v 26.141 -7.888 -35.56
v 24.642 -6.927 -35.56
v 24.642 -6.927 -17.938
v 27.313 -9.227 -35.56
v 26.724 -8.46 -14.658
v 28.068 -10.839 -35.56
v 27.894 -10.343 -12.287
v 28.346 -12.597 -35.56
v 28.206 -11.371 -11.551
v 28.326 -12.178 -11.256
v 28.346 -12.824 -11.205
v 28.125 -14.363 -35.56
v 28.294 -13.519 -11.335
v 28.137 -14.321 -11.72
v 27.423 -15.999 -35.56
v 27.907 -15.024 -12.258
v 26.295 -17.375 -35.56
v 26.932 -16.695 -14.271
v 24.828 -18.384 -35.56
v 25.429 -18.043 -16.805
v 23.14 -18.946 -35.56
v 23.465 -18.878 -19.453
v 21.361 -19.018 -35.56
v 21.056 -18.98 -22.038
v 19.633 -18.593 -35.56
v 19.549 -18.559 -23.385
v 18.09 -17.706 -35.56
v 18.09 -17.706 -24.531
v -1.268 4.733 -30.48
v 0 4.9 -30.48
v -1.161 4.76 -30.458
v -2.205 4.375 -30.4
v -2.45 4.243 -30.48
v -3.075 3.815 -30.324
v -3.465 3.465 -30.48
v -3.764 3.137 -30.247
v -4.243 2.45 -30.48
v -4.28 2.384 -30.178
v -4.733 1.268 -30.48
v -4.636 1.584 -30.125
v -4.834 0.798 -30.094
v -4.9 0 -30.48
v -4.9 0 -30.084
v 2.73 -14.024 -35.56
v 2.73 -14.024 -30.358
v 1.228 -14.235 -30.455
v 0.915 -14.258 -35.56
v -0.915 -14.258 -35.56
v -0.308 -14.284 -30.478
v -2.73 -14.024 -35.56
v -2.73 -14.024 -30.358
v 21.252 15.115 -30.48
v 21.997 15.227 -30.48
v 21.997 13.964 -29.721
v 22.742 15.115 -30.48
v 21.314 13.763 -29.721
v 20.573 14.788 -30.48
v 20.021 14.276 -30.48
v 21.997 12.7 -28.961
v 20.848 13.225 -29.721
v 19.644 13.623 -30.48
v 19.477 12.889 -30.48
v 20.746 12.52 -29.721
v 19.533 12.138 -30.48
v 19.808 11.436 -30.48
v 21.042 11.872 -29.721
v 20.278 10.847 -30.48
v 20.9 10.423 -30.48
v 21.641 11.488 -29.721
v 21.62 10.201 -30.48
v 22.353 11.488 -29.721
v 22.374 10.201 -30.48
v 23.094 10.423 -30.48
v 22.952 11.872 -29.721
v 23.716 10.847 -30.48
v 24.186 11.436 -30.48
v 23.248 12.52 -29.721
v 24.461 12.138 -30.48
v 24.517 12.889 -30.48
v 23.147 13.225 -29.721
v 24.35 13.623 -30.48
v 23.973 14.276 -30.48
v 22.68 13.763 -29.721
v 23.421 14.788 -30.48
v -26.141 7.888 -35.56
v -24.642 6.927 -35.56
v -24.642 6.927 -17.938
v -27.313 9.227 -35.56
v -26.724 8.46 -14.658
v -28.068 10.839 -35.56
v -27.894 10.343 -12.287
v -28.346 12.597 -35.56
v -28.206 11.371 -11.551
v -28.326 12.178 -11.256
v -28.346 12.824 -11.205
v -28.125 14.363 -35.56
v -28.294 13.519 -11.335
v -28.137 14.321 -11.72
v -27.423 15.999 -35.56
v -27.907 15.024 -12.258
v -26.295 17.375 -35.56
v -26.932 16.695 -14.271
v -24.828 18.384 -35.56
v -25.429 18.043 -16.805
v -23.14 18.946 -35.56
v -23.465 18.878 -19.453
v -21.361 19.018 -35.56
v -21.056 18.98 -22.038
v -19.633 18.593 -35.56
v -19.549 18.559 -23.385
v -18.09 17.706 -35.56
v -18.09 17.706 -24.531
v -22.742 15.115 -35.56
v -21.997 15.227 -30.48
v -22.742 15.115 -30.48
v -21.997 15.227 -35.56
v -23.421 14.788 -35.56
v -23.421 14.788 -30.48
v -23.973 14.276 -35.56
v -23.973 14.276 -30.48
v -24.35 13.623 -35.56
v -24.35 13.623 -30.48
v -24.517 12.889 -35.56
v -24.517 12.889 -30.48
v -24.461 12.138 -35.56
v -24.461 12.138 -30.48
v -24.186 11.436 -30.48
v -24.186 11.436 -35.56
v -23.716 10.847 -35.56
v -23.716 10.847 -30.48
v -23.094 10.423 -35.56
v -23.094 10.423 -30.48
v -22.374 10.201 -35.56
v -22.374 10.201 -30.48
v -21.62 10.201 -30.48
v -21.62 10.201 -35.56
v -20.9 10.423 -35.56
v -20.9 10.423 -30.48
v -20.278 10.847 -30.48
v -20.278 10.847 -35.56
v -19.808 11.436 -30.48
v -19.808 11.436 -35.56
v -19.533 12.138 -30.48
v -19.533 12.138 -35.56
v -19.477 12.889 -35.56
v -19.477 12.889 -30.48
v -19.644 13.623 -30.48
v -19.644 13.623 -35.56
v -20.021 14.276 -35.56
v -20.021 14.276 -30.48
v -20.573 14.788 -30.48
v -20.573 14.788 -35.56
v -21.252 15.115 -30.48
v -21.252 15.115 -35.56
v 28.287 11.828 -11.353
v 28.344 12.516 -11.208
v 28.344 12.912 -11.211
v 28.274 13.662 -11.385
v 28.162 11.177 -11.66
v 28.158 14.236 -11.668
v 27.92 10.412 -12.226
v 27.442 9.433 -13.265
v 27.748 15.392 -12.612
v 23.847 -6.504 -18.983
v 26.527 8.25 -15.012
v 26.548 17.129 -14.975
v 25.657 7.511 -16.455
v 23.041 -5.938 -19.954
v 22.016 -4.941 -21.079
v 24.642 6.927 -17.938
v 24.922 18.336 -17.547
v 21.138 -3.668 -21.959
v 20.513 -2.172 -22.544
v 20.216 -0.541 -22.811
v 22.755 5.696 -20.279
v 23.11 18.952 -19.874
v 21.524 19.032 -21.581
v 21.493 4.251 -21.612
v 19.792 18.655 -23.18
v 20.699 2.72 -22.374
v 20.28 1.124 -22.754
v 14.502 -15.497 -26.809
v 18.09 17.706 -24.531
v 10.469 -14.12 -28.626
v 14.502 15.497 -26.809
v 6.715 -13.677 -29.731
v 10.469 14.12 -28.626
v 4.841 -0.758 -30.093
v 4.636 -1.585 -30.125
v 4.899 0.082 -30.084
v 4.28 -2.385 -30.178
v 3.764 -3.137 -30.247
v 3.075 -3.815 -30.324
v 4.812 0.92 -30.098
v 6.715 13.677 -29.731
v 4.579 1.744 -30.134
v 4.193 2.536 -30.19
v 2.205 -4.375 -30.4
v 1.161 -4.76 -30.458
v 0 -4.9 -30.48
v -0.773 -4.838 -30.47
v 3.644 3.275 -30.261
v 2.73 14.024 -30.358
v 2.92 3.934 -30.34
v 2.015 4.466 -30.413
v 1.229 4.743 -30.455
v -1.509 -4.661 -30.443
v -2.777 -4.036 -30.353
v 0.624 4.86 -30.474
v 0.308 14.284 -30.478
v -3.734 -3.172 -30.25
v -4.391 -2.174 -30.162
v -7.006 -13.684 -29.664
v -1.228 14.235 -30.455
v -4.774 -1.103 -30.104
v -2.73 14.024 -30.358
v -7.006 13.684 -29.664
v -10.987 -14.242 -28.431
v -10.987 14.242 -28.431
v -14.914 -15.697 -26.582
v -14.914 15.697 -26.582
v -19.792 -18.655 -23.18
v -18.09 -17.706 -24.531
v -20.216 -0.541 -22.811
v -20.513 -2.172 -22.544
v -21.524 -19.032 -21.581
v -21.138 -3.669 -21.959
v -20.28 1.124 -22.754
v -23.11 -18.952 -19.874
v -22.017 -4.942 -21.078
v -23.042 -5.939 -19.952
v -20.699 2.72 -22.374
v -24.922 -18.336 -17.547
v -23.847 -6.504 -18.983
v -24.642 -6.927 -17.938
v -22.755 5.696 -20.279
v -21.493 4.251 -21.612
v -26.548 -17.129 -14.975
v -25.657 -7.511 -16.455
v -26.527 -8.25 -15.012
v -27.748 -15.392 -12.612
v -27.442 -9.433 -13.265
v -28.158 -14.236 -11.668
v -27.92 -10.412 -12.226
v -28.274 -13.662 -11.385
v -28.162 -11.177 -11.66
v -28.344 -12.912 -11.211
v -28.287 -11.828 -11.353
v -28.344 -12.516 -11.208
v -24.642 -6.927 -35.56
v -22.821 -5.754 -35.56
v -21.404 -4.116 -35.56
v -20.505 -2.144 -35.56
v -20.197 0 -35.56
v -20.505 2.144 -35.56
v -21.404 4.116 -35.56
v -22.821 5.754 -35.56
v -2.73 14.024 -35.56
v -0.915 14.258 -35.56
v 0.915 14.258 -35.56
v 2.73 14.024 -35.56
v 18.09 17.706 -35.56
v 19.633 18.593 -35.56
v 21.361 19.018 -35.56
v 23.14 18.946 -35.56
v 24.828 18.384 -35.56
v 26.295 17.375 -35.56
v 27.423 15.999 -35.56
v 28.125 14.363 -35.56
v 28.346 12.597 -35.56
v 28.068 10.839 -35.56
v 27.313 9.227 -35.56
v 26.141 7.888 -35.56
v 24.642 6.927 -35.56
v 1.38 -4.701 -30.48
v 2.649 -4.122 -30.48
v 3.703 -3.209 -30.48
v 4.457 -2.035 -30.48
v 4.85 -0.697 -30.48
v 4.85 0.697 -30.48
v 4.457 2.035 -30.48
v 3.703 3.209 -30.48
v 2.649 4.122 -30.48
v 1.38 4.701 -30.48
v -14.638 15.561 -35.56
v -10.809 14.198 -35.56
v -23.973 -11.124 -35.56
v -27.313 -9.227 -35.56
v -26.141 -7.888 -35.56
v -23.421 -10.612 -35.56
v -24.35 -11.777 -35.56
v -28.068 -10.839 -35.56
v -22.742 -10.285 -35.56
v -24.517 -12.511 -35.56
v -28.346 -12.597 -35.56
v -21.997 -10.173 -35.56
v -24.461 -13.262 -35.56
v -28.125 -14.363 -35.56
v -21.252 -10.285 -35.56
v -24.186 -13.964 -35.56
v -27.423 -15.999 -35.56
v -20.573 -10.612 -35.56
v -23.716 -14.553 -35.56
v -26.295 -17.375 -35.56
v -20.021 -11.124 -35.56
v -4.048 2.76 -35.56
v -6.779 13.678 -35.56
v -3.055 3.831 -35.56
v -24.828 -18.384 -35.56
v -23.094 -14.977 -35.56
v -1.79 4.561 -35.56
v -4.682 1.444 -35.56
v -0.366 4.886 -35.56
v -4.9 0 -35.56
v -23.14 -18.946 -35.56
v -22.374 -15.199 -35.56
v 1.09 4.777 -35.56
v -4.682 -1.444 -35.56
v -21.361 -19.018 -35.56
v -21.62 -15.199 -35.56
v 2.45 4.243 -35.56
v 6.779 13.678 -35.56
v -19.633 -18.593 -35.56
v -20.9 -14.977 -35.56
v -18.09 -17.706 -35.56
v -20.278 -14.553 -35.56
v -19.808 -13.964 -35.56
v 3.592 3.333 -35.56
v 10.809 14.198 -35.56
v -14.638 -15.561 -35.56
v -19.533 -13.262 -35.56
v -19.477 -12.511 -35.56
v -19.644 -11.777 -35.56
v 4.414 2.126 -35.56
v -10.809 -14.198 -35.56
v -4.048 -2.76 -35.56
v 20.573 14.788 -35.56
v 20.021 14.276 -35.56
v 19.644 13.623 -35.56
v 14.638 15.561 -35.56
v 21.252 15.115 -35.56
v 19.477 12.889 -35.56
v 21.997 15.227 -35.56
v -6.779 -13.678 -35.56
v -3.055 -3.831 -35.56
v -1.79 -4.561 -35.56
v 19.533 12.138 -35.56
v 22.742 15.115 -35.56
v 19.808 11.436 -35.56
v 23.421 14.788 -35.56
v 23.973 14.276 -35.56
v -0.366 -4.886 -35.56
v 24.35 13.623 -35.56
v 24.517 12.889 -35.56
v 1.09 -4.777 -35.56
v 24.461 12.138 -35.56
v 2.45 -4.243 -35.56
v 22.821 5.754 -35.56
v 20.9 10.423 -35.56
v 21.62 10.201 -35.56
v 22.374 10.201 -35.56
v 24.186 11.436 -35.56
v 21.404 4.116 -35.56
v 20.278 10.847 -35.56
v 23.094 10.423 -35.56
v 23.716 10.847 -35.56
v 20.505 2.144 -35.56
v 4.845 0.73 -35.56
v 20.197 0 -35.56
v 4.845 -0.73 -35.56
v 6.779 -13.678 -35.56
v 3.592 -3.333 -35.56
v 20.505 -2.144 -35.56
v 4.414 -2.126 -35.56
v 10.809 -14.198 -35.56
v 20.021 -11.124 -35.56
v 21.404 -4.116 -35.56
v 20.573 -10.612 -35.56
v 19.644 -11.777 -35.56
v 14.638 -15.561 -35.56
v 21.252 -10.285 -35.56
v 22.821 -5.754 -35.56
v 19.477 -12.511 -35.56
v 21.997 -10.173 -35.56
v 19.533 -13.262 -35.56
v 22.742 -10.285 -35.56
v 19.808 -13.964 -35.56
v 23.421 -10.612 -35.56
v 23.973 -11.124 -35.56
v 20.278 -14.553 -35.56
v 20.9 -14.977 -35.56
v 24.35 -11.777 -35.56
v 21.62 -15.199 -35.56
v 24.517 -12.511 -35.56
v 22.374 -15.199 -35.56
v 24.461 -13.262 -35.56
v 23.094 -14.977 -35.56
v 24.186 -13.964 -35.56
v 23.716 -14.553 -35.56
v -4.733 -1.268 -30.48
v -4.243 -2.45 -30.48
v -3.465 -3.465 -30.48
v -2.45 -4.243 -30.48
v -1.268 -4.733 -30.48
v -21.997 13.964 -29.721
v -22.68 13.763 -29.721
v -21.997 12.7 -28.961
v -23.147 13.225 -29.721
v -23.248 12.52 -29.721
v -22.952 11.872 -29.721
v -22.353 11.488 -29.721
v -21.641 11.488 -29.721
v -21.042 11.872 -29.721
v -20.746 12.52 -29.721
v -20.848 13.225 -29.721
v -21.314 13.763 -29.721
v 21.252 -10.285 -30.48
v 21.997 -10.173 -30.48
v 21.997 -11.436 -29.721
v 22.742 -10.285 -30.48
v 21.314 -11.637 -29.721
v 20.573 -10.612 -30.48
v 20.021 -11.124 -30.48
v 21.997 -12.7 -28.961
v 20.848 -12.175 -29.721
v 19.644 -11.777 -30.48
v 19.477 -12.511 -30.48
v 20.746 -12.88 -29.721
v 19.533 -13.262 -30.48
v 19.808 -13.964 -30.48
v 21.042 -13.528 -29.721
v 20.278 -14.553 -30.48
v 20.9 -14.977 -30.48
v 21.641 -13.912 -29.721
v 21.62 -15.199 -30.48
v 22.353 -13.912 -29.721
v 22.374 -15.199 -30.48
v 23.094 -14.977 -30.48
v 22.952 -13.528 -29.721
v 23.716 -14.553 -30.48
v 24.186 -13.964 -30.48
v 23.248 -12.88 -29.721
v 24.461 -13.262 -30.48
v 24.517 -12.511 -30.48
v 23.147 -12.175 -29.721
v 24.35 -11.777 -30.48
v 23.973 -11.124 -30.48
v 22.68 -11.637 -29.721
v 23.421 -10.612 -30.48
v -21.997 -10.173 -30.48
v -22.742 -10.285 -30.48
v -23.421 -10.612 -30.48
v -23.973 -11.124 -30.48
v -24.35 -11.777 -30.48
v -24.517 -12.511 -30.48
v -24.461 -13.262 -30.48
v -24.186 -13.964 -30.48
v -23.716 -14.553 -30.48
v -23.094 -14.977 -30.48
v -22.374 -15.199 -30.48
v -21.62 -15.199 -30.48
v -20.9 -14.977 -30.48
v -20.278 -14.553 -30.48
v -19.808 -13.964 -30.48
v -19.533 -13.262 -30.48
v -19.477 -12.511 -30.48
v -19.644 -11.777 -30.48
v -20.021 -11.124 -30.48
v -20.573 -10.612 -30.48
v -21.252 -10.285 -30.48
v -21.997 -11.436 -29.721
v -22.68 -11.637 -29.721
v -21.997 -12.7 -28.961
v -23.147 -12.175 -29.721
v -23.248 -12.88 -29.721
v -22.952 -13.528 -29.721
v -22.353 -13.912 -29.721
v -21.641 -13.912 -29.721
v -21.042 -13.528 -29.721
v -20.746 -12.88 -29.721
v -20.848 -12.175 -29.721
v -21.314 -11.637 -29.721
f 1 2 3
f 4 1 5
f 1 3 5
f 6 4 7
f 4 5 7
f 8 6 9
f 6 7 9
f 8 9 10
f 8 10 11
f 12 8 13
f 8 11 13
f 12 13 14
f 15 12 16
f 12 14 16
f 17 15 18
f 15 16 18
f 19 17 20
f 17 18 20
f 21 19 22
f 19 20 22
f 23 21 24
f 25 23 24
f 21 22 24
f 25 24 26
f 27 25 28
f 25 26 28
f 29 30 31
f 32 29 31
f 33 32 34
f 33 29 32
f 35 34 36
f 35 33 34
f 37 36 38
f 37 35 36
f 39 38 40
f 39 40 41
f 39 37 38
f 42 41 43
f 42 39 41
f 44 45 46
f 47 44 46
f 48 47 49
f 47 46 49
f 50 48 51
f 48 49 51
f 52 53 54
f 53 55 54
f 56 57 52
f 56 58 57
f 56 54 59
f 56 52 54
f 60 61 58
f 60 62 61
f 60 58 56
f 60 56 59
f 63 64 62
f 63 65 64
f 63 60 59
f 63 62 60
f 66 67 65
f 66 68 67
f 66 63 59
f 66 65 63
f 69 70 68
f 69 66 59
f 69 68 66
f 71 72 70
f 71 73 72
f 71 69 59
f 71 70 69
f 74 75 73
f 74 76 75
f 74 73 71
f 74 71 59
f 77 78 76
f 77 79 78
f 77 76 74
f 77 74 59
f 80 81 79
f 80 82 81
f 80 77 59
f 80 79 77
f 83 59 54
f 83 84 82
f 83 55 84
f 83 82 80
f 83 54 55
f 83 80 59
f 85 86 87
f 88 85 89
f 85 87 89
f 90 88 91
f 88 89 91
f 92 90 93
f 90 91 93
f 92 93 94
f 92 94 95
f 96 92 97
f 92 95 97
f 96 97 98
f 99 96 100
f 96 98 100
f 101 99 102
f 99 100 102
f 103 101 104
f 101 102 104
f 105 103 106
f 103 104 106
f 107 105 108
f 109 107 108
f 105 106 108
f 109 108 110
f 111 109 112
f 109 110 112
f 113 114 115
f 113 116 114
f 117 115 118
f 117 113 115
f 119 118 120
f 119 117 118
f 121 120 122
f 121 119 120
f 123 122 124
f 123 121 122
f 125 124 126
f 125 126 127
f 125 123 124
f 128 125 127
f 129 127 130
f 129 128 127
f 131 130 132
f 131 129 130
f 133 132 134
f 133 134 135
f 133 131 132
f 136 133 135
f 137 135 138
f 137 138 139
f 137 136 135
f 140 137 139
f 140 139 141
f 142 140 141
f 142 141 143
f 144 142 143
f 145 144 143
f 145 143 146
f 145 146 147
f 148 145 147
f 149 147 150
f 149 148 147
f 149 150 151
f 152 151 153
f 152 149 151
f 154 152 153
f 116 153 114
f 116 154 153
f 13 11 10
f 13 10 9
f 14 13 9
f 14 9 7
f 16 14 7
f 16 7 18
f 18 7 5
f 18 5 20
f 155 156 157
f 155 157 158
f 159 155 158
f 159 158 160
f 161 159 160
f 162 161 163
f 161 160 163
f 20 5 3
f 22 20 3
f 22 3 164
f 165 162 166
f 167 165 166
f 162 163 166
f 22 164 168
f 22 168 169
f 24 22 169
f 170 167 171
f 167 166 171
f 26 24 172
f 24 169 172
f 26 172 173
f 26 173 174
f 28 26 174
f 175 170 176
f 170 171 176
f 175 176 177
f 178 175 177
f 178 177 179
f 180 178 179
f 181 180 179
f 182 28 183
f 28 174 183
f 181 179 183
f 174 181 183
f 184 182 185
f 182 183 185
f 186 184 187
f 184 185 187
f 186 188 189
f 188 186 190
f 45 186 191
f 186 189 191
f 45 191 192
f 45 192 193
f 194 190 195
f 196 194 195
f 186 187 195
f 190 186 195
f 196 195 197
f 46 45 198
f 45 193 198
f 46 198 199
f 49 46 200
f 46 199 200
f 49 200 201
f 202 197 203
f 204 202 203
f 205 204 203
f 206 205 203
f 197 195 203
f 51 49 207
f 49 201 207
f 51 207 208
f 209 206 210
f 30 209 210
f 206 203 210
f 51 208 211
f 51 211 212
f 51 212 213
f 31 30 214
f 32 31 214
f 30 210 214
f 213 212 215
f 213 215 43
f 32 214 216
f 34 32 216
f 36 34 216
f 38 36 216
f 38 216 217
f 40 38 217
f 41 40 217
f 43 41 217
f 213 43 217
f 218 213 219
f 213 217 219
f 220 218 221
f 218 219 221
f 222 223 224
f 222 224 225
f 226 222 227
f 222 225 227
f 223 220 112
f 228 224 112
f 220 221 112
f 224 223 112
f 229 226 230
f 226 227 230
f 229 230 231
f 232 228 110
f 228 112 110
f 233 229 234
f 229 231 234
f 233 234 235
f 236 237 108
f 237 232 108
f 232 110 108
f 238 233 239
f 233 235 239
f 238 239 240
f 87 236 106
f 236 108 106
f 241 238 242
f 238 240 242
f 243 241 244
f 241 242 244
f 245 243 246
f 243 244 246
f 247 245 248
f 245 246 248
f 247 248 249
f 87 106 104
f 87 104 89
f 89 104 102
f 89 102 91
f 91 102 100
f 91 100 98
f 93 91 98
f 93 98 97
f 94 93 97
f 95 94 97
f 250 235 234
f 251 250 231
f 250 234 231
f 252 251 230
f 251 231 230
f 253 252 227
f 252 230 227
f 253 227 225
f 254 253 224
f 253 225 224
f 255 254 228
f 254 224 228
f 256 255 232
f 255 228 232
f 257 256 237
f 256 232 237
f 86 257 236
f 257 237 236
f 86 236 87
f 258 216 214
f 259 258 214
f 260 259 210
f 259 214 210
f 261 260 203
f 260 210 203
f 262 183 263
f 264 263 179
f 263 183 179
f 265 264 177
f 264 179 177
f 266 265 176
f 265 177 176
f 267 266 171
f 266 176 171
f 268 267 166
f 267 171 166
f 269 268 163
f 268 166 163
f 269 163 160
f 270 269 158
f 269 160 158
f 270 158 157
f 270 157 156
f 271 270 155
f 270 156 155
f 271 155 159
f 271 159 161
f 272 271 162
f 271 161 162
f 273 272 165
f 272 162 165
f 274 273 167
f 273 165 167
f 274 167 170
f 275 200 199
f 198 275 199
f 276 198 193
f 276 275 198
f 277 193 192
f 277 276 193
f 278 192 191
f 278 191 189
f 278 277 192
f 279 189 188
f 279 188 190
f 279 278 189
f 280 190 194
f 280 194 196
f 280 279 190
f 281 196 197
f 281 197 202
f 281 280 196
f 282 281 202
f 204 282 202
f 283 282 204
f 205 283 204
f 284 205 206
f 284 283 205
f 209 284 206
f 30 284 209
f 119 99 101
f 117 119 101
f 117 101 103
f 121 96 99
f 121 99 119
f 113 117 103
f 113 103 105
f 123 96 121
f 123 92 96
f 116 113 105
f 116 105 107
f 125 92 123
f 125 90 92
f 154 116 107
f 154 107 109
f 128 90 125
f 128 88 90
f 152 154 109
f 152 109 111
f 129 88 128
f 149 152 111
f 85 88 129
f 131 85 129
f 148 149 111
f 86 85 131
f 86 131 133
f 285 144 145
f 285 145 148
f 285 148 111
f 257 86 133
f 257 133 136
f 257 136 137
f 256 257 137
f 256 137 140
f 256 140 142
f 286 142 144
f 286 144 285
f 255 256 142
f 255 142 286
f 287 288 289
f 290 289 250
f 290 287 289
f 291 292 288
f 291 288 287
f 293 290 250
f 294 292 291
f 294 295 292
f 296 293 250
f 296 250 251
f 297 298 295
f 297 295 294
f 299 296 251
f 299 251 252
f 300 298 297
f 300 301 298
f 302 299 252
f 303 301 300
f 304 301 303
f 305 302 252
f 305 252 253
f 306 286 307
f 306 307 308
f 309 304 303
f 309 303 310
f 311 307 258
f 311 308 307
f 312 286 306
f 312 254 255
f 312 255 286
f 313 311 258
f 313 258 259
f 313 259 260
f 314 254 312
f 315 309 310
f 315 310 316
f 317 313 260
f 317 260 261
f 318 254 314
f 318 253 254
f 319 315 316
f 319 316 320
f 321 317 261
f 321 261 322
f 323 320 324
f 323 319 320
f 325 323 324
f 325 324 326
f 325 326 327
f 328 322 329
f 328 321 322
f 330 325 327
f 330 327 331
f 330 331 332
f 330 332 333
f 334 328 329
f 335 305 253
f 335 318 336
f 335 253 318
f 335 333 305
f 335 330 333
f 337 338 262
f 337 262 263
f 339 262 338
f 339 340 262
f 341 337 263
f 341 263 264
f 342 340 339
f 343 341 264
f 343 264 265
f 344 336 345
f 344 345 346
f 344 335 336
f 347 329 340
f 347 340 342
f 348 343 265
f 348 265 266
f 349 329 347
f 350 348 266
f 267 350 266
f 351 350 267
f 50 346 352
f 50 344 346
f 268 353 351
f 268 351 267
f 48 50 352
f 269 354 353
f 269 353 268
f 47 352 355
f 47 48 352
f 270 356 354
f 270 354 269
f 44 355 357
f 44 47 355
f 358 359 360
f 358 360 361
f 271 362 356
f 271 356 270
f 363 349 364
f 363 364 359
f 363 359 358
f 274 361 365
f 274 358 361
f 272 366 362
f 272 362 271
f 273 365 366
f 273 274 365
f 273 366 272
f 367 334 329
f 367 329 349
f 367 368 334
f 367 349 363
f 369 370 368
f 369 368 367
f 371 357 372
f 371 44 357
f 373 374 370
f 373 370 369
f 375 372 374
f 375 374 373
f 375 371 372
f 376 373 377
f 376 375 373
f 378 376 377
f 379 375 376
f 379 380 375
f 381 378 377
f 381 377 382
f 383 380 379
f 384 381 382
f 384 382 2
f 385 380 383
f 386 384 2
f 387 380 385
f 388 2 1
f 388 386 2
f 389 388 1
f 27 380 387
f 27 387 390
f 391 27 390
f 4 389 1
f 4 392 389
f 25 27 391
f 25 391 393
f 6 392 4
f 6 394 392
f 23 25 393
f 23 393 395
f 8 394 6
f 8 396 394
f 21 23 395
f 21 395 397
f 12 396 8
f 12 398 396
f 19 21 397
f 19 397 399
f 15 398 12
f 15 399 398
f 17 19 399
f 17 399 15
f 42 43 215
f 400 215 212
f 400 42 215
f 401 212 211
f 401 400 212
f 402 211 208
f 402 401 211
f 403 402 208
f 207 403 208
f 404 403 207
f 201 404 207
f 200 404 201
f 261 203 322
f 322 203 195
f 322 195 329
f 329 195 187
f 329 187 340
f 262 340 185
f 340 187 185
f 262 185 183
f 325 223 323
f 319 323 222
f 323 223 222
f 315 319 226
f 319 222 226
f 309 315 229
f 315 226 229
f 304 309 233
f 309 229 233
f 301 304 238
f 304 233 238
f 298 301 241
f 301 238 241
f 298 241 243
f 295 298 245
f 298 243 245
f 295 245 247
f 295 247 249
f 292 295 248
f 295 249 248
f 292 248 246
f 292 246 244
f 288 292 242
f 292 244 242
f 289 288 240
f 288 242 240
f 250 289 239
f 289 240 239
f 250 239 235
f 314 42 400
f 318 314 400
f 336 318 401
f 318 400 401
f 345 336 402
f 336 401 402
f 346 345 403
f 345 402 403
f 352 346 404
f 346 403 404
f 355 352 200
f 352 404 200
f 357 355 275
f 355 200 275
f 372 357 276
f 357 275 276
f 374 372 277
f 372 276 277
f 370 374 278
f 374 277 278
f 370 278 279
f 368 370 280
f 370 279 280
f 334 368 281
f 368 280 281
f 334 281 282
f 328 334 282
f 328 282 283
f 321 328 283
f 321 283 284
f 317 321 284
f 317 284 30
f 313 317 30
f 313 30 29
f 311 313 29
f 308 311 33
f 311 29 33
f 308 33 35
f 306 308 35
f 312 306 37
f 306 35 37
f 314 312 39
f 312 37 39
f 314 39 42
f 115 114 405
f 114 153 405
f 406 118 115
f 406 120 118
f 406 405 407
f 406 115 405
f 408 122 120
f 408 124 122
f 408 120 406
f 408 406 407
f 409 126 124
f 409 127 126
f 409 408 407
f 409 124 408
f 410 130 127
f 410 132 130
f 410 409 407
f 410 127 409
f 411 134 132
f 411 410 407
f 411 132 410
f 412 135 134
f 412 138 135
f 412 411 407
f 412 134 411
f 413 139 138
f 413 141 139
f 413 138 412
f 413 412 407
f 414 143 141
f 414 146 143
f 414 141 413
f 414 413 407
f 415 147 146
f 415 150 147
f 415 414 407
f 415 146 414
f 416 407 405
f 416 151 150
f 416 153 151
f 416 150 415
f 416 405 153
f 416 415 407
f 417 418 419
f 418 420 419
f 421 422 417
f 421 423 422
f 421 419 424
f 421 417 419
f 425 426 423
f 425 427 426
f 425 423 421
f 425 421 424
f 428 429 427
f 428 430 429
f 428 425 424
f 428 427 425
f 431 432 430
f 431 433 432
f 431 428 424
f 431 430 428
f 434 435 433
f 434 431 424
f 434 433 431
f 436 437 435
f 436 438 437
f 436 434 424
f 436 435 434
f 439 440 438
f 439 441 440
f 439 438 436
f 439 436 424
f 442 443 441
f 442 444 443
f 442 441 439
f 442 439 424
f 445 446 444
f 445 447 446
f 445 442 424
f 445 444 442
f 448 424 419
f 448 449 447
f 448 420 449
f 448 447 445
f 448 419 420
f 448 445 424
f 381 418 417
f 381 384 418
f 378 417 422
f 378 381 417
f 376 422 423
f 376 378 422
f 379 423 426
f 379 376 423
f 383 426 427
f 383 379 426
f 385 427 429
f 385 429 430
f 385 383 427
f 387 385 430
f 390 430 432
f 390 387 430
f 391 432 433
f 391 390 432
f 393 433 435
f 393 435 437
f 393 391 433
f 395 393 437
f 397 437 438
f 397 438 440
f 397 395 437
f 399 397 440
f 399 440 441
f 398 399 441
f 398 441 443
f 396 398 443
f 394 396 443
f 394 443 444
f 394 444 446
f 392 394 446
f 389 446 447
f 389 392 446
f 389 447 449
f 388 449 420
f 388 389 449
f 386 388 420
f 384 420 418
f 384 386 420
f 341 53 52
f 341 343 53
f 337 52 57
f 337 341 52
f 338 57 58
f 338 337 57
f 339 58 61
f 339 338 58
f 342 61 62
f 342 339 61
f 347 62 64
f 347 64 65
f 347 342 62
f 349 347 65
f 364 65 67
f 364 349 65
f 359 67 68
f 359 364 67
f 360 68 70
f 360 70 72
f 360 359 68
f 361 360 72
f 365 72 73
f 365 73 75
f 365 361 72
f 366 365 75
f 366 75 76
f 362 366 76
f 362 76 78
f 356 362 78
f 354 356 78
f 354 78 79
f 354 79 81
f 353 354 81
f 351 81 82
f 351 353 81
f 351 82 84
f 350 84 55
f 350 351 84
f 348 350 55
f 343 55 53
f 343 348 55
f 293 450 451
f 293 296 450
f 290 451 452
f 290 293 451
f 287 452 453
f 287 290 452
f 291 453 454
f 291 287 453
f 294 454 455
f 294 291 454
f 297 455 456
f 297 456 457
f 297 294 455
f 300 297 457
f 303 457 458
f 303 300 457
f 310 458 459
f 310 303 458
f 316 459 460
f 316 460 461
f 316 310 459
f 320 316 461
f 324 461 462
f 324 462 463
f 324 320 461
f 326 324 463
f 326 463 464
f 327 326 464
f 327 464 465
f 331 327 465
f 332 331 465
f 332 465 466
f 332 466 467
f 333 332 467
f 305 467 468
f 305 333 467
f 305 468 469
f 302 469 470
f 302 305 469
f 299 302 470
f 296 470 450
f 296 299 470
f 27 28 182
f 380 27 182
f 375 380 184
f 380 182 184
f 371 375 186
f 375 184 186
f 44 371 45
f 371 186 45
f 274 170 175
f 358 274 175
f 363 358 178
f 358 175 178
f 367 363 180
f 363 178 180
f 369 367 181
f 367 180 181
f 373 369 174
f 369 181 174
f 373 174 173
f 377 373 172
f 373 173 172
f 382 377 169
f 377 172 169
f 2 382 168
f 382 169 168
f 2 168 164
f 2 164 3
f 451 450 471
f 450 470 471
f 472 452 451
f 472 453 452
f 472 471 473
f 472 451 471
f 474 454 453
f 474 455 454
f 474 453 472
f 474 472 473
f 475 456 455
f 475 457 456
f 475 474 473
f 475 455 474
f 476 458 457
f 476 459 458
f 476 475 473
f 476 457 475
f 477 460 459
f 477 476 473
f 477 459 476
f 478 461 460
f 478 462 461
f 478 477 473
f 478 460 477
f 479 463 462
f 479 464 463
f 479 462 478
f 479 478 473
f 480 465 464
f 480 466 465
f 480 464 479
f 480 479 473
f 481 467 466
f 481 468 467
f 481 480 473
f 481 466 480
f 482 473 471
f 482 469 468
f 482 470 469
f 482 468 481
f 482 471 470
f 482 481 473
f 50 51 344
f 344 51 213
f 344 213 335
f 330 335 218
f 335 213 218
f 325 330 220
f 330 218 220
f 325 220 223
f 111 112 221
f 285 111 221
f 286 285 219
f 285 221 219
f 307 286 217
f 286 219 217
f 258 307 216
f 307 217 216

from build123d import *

# Parameters (mm, degrees)
SKETCH2_W                           = 30.48
SKETCH2_H                           = 152.4
BOSS_EXTRUDE1_DEPTH                 = 25.4
BOSS_EXTRUDE1_DEPTH_BACK            = 5.08
SKETCH4_R                           = 4.89966
F_8_0_199_DIAMETER_HOLE1_AT_2_COUNT = 2
F_8_0_199_DIAMETER_HOLE1_AT_2_PITCH = 50.8
F_8_0_199_DIAMETER_HOLE1_AT_3_COUNT = 2
F_8_0_199_DIAMETER_HOLE1_AT_3_PITCH = 43.994090512
F_8_0_199_DIAMETER_HOLE1_AT_4_COUNT = 2
F_8_0_199_DIAMETER_HOLE1_AT_4_PITCH = 25.4


with BuildPart() as part:
    # Sketch2 → Revolve1 (revolve)
    with BuildSketch(Plane(origin=(0, 0, 0), x_dir=(0, 0, -1), z_dir=(1, 0, 0))):
        with Locations((15.24, 0)):
            Rectangle(SKETCH2_W, SKETCH2_H)
    revolve(axis=Axis((0, -76.2, 0), (0, 1, 0)))


with BuildPart() as body_2:
    # Sketch4 → Boss-Extrude1 (new, two sides: drawn at the far end of the back side and taken through both)
    with BuildSketch(Plane(origin=(0, 0, -30.48), x_dir=(-1, 0, 0), z_dir=(0, 0, 1)).offset(-BOSS_EXTRUDE1_DEPTH_BACK)):
        with BuildLine():
            ThreePointArc((-24.642441225, -6.927272727), (-20.196916389, 0), (-24.642441225, 6.927272727))
            ThreePointArc((-24.642441225, 6.927272727), (-27.423118543, 15.998519166), (-18.090128015, 17.705846349))
            ThreePointArc((-18.090128015, 17.705846349), (-10.809478571, 14.198051615), (-2.729732697, 14.024308028))
            ThreePointArc((-2.729732697, 14.024308028), (0, 14.2875), (2.729732697, 14.024308028))
            ThreePointArc((2.729732697, 14.024308028), (10.809478571, 14.198051615), (18.090128015, 17.705846349))
            ThreePointArc((18.090128015, 17.705846349), (27.423118543, 15.998519166), (24.642441225, 6.927272727))
            ThreePointArc((24.642441225, 6.927272727), (20.196916389, 0), (24.642441225, -6.927272727))
            ThreePointArc((24.642441225, -6.927272727), (27.423118543, -15.998519166), (18.090128015, -17.705846349))
            ThreePointArc((18.090128015, -17.705846349), (10.809478571, -14.198051615), (2.729732697, -14.024308028))
            ThreePointArc((2.729732697, -14.024308028), (0, -14.2875), (-2.729732697, -14.024308028))
            ThreePointArc((-2.729732697, -14.024308028), (-10.809478571, -14.198051615), (-18.090128015, -17.705846349))
            ThreePointArc((-18.090128015, -17.705846349), (-27.423118543, -15.998519166), (-24.642441225, -6.927272727))
        make_face()
        Circle(SKETCH4_R, mode=Mode.SUBTRACT)
    extrude(amount=BOSS_EXTRUDE1_DEPTH + BOSS_EXTRUDE1_DEPTH_BACK)

    # Sketch10 → #8 (0.199) Diameter Hole1 (revolve, cut)
    with BuildSketch(Plane(origin=(-21.997045256, 12.7, -35.56), x_dir=(0, 1, 0), z_dir=(1, 0, 0))):
        Polygon((0, 0), (0, 6.598555042), (2.5273, 5.08), (2.5273, 0), align=None)
    f_8_0_199_diameter_hole1 = revolve(axis=Axis((-21.997045256, 12.7, -41.91), (0, 0, 1)), mode=Mode.SUBTRACT)

    # #8 (0.199) Diameter Hole1 at 2: #8 (0.199) Diameter Hole1 ×2
    with Locations(*[Vector(0.8660254037844379, -0.5000000000000014, -6.031920370010707e-15) * (i * F_8_0_199_DIAMETER_HOLE1_AT_2_PITCH) for i in range(1, F_8_0_199_DIAMETER_HOLE1_AT_2_COUNT)]):
        add(f_8_0_199_diameter_hole1, mode=Mode.SUBTRACT)

    # #8 (0.199) Diameter Hole1 at 3: #8 (0.199) Diameter Hole1 ×2
    with Locations(*[(i * F_8_0_199_DIAMETER_HOLE1_AT_3_PITCH, 0, 0) for i in range(1, F_8_0_199_DIAMETER_HOLE1_AT_3_COUNT)]):
        add(f_8_0_199_diameter_hole1, mode=Mode.SUBTRACT)

    # #8 (0.199) Diameter Hole1 at 4: #8 (0.199) Diameter Hole1 ×2
    with Locations(*[(0, -i * F_8_0_199_DIAMETER_HOLE1_AT_4_PITCH, 0) for i in range(1, F_8_0_199_DIAMETER_HOLE1_AT_4_COUNT)]):
        add(f_8_0_199_diameter_hole1, mode=Mode.SUBTRACT)

    # Combine4: cut part
    add(part.part, mode=Mode.SUBTRACT)


solid = body_2.part
